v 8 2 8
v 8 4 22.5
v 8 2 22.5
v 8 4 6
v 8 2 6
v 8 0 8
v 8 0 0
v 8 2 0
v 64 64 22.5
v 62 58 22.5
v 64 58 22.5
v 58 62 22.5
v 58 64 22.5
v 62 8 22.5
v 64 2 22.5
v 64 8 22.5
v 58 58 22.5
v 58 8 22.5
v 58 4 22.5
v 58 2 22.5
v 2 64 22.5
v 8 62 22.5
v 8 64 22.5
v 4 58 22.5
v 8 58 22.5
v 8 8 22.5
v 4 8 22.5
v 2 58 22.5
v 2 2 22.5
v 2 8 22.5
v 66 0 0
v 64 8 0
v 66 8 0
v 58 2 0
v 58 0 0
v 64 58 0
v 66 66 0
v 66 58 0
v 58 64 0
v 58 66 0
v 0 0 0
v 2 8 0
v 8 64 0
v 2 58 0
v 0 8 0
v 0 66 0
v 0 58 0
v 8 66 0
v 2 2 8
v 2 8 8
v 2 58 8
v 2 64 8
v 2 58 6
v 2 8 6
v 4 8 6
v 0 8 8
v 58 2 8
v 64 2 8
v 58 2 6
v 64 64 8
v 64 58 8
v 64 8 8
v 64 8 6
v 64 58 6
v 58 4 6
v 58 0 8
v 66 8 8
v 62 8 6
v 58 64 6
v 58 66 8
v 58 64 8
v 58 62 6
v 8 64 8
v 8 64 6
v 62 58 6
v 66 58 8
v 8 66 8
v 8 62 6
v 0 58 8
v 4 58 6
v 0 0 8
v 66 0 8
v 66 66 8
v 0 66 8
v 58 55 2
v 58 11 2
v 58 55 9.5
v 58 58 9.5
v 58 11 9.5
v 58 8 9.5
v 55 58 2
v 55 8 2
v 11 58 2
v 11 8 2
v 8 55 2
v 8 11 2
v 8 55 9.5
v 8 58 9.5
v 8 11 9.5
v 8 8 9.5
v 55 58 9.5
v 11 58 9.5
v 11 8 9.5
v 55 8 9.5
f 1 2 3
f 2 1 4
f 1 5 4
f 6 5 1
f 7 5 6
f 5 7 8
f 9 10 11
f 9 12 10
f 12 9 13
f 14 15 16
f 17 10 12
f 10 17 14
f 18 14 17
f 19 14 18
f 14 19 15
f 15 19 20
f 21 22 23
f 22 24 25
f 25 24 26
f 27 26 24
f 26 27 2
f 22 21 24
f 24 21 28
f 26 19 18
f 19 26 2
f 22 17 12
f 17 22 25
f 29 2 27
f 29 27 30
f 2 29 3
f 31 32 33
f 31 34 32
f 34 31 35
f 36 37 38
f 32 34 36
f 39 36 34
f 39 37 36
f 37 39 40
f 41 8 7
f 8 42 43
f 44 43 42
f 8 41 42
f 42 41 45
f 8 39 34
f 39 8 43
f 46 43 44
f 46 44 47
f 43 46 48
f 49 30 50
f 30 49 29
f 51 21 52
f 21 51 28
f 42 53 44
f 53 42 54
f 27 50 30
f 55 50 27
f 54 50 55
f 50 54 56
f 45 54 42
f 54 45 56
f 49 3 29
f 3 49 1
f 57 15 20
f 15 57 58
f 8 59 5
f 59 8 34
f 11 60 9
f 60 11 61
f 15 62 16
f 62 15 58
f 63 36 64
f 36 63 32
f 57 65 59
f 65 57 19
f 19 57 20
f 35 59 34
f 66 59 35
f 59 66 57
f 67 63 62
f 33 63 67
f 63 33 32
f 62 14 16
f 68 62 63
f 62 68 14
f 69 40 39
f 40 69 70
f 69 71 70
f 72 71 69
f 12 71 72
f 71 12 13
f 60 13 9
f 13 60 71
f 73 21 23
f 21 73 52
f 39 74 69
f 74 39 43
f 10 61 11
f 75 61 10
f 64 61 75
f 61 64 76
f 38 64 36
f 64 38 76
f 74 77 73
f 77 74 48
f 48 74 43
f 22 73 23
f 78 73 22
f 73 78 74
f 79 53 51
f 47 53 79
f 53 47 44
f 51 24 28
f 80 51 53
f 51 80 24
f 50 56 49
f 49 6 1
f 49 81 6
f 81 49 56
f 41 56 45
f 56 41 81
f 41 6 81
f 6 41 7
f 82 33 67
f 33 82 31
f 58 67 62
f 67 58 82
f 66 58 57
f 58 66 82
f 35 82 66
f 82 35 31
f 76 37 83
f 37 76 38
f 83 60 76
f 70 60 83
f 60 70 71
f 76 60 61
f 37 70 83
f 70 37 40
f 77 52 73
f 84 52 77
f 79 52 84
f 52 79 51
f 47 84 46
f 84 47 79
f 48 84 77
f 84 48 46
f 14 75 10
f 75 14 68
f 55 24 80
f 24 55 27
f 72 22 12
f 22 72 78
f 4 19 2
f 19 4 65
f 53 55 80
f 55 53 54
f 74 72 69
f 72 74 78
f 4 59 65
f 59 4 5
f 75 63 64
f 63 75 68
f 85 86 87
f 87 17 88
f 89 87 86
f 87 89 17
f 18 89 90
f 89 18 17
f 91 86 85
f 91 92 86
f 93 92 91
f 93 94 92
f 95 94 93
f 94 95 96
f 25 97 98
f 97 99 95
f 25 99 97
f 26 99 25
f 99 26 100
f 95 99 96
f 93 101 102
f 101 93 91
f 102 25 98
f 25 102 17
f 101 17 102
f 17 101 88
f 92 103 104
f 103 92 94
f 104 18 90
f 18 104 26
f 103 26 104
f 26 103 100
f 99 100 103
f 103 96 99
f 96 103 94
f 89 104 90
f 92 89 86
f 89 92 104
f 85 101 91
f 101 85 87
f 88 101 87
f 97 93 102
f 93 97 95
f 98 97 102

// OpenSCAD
// Base unit

// Inputs
board_size = 50;
board_height = 3;

capaciter_length = 30;
capaciter_diameter = 7.5;

face_size = 4;
edge_size = 6;
corner_size = 8;

rest_size = 3;

base_thickness = 2;
board_section_height = 5;
cap_section_height = 10;

// Parameters
face_xysize = board_size + (2 * face_size);
edge_xysize = board_size + (2 * edge_size);

face_offset = corner_size - face_size;
edge_offset = corner_size - edge_size;

rest_height = base_thickness + capaciter_diameter;

total_height = base_thickness + capaciter_diameter + board_height + 10;
points = [[0,0], [1,0], [1,1], [0,1]];
angles = [0,90,180, 270];

// Method
difference() {
    union() {
        // faces
        translate([face_offset, face_offset, 0]) {
            cube([face_xysize, face_xysize, total_height], false);
        }
        
        // bottom edges
        translate([edge_offset, edge_offset, 0]) {
           cube([edge_xysize, edge_xysize, edge_size], false);
        }
        
        // side edges
        for(i = [0:3]) {
                translate([edge_offset + (edge_size + board_size) * points[i][0], edge_offset + (edge_size + board_size) * points[i][1], 0]) { 
                    cube([edge_size, edge_size, total_height], false);
                }
        }
        
        // corners
        for(i = [0:3]) {
                translate([(corner_size + board_size) * points[i][0], (corner_size + board_size) * points[i][1], 0]) { 
                    cube([corner_size, corner_size, corner_size], false);
                }
        }
    }
    
    // Hollow out for board
    translate([face_offset + face_size, face_offset + face_size, base_thickness]) {
       cube([board_size, board_size, total_height], false);
    }
}

// Create rests for board

for(i = [0:3]) {
    translate([face_offset + face_size + board_size * points[i][0], face_offset + face_size + board_size * points[i][1], 0]) {
        rotate([0,0,angles[i]]) {
            prism(rest_size, rest_height); 
        }
    }
}

module prism(side, height) {
    linear_extrude(height=height, center=false, twist=0, scale=1, slices=1) {
        polygon([[0,0], [side, 0], [0, side]]); 
    }   
}
